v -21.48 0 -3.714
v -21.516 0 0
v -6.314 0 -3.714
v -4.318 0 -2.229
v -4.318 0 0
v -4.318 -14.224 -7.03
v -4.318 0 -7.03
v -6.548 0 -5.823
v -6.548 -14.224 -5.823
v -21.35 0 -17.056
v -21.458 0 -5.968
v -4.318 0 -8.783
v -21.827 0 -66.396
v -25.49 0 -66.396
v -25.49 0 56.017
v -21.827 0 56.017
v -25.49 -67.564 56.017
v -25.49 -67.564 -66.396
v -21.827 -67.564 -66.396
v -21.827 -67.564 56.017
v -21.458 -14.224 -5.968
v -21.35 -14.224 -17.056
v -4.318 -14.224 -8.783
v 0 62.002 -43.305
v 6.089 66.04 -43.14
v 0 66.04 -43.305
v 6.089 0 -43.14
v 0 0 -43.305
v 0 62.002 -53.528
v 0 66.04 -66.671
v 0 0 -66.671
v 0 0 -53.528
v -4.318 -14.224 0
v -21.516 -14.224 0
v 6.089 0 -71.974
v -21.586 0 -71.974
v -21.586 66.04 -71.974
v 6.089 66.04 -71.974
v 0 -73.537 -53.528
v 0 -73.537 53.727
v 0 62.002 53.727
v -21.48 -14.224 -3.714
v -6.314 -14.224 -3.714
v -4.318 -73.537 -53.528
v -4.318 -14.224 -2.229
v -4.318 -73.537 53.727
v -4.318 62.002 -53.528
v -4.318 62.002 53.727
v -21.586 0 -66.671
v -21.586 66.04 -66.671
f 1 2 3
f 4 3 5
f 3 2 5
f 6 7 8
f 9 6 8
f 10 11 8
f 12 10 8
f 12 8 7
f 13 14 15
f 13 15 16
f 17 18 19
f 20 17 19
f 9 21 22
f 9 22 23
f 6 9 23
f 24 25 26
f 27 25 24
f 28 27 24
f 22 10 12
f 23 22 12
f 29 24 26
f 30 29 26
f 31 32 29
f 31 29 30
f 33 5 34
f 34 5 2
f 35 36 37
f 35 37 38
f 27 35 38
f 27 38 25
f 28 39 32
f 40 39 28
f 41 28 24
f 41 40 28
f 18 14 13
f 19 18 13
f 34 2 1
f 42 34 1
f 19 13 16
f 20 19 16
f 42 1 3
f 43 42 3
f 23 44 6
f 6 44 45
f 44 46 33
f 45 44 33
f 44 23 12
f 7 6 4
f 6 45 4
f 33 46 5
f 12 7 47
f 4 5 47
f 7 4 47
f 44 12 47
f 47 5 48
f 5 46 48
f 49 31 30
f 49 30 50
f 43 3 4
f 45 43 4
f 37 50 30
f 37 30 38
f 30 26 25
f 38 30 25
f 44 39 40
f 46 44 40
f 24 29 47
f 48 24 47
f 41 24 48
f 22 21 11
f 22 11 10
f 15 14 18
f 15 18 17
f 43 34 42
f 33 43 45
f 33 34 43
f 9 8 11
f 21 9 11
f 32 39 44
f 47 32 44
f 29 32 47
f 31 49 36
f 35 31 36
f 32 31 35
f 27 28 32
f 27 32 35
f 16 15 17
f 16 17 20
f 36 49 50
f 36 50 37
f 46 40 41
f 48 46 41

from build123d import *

# Parameters (mm, degrees)
F0_W     = 135.538697
F0_H     = 107.255034
F1_DEPTH = 4.318
F3_W     = 3.66321
F3_H     = 122.412201
F4_DEPTH = 67.564
F5_DEPTH = 66.04
F7_DEPTH = 14.224


with BuildPart() as f1:
    # F0 (on Right) → F1 (new body)
    with BuildSketch(Plane.YZ):
        with Locations((-5.767196, 0.099536)):
            Rectangle(F0_W, F0_H)
    extrude(amount=-F1_DEPTH)

    # F2 (on Front) → F5 (join)
    with BuildSketch(Plane.XZ):
        Polygon((6.088697, -43.139536), (0, -43.305252), (0, -66.671006), (-21.58564, -66.671006), (-21.58564, -71.973875), (6.088697, -71.973875), align=None)
    extrude(amount=-F5_DEPTH)

    # F6 (on Front) → F7 (join)
    with BuildSketch(Plane.XZ):
        Polygon((-3.950159, 0), (-21.515906, 0), (-21.479825, -3.713604), (-6.313822, -3.713604), (-3.950159, -1.955935), align=None)
        Polygon((-6.548177, -5.822806), (-21.457924, -5.967668), (-21.35019, -17.056067), (-3.950159, -8.604623), (-3.950159, -7.228941), align=None)
    extrude(amount=F7_DEPTH)


with BuildPart() as f4:
    # F3 (on Front) → F4 (new body)
    with BuildSketch(Plane.XZ):
        with Locations((-23.658217, -5.18954)):
            Rectangle(F3_W, F3_H)
    extrude(amount=F4_DEPTH)


solid = Compound([f1.part, f4.part])
